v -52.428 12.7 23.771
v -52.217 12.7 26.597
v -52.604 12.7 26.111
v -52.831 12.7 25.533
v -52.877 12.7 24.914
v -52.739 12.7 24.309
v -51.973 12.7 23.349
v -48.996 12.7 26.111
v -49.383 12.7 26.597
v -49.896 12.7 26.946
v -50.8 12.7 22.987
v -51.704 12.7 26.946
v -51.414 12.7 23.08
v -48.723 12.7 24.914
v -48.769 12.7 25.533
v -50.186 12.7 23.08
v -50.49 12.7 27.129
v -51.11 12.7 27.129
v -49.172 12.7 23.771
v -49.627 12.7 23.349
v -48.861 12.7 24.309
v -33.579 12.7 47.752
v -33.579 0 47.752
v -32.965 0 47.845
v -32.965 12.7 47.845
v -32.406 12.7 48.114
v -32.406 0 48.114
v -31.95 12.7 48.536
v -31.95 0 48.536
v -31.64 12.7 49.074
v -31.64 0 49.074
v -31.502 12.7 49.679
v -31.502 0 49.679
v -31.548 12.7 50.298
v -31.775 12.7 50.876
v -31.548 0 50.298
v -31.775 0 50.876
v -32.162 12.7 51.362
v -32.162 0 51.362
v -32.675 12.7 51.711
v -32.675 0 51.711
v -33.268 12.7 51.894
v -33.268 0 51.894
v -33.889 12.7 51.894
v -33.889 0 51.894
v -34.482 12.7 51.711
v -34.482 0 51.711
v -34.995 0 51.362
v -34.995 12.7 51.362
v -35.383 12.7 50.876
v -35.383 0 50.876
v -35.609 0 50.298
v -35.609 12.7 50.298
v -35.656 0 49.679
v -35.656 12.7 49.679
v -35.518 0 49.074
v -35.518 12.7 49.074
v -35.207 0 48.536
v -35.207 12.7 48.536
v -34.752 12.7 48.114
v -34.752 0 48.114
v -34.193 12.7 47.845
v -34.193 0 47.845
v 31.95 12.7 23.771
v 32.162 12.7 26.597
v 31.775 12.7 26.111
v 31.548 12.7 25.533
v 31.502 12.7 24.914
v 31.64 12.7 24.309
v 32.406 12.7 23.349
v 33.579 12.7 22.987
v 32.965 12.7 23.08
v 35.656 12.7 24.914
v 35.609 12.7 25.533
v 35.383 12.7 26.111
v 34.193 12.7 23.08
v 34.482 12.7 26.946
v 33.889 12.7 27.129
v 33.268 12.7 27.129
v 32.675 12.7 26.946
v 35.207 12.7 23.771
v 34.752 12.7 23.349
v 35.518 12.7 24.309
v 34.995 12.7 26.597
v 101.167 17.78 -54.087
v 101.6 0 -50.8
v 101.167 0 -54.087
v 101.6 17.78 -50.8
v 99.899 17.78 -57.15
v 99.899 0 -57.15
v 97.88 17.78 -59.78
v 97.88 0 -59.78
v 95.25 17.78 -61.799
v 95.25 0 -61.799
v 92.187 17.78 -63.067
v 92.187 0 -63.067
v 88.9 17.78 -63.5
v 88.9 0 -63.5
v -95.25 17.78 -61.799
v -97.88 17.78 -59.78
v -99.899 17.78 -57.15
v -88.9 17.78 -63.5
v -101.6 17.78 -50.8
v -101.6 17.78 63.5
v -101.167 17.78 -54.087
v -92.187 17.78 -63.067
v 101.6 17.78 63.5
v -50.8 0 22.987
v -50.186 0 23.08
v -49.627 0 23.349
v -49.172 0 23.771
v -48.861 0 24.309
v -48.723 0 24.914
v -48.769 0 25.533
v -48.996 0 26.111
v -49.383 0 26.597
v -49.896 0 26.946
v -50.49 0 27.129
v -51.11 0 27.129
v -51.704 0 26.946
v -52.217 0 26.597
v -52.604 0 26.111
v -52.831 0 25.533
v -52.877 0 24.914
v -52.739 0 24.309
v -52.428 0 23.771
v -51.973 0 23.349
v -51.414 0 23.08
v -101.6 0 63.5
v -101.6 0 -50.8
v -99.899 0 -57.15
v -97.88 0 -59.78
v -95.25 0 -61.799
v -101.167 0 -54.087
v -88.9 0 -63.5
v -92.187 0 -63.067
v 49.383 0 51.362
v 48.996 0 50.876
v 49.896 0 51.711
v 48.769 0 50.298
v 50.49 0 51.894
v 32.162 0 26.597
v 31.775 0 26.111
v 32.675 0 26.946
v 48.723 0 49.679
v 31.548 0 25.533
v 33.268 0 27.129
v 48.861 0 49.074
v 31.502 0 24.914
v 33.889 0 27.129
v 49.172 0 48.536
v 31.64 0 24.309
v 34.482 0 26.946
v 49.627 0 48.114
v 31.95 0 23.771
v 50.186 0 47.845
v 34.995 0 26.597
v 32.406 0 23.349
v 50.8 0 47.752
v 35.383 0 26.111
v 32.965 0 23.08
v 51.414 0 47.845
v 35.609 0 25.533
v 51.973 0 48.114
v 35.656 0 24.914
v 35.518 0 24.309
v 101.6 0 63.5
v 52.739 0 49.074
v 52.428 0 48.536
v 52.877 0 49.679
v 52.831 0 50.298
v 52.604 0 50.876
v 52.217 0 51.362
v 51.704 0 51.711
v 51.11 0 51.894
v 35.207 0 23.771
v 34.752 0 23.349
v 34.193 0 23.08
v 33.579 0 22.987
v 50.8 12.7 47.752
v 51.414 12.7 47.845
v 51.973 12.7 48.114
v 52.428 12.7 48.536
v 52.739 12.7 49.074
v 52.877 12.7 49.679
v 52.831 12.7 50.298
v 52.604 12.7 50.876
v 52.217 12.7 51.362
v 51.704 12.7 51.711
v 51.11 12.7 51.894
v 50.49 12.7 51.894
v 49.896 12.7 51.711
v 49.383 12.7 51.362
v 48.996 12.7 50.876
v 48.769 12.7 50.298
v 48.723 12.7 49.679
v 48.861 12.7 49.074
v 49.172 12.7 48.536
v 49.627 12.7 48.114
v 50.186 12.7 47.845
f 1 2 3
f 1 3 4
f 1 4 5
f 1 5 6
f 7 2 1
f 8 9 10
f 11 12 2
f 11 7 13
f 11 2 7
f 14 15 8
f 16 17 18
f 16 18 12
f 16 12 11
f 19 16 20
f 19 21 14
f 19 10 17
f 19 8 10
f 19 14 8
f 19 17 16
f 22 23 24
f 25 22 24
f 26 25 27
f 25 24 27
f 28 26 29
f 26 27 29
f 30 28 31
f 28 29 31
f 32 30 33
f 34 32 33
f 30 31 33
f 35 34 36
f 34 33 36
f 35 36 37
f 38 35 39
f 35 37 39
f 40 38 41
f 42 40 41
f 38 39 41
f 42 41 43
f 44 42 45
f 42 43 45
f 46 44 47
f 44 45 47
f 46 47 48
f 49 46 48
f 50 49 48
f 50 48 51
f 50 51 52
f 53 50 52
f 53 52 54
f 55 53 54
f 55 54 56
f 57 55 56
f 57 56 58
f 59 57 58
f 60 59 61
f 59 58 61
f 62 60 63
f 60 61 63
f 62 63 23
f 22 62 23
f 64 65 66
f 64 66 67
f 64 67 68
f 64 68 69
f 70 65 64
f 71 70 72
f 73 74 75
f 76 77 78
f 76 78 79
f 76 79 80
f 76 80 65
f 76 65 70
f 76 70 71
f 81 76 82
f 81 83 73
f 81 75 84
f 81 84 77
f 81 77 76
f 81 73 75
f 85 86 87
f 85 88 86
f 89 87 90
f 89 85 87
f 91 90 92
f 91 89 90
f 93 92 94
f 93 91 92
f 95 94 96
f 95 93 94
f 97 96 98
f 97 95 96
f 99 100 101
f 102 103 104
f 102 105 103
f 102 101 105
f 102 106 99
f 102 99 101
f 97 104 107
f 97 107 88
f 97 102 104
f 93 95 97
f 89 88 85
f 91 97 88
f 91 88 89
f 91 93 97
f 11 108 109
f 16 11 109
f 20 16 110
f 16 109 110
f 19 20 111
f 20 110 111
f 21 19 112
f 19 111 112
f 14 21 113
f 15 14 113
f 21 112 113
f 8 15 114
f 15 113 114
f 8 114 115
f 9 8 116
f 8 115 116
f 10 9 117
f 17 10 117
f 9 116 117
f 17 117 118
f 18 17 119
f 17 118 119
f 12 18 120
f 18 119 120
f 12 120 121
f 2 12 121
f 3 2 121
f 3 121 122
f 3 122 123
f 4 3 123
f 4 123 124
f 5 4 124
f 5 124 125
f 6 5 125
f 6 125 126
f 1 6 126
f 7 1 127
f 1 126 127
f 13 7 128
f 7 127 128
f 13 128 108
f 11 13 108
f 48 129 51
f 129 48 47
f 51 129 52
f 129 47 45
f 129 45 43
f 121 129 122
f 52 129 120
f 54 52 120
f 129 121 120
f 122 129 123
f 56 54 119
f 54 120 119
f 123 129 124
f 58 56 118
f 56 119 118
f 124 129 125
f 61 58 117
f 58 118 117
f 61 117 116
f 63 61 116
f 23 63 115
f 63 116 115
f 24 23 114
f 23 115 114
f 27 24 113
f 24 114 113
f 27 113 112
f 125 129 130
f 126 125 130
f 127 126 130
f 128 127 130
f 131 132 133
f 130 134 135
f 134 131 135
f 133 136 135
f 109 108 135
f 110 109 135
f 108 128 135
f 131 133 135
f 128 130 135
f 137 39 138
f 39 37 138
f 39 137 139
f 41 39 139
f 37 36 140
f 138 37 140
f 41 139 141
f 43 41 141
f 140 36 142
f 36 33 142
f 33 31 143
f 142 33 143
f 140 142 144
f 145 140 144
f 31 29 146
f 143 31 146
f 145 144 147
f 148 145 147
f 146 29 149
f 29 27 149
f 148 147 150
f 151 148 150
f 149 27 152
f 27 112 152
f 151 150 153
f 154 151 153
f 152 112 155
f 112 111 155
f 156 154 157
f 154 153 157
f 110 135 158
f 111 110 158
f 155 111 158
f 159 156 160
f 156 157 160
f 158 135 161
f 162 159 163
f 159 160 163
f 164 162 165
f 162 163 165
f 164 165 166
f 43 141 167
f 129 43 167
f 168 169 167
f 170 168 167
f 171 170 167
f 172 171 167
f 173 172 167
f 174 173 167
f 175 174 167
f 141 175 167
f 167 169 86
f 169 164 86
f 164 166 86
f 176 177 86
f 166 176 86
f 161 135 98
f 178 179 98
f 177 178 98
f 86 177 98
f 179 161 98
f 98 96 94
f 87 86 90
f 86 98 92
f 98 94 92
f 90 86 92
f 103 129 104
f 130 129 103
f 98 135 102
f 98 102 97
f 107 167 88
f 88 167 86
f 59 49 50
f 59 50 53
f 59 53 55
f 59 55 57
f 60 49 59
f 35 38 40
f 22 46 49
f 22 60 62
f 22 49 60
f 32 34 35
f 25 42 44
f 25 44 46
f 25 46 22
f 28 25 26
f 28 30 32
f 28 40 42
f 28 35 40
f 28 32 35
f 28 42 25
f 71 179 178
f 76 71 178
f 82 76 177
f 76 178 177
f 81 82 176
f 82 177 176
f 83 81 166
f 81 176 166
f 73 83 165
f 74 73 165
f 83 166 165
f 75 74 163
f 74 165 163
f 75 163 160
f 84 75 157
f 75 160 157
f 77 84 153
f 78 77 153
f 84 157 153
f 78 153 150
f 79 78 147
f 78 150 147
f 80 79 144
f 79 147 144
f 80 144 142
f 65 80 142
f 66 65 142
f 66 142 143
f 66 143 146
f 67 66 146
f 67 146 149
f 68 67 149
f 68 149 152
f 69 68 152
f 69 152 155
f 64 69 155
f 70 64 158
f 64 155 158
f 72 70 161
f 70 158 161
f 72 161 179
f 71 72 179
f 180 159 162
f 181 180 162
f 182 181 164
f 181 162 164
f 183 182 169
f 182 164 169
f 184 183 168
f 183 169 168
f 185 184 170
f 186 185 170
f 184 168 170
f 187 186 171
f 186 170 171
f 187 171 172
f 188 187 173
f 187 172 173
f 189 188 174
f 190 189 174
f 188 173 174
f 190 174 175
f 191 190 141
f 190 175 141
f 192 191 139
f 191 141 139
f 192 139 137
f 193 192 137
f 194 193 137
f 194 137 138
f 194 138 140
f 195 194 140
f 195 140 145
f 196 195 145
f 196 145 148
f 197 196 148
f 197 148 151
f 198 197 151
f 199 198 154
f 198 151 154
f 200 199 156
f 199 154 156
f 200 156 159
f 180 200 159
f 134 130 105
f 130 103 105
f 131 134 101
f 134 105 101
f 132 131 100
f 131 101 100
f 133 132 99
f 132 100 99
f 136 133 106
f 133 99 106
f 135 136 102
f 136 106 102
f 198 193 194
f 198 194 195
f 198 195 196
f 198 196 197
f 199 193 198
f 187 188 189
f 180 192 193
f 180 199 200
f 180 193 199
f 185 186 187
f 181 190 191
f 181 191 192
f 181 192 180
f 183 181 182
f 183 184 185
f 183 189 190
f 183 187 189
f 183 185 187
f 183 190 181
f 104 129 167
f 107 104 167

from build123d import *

# Parameters (mm, degrees)
SKETCH2_W           = 203.2
SKETCH2_H           = 127
BOSS_EXTRUDE2_DEPTH = 17.78
FILLET1_R           = 12.7
SKETCH5_R           = 2.0828
CUT_EXTRUDE2_DEPTH  = 12.7


with BuildPart() as part:
    # Sketch2 → Boss-Extrude2 (new body)
    with BuildSketch(Plane(origin=(0, 0, 0), x_dir=(1, 0, 0), z_dir=(0, 1, 0))):
        Rectangle(SKETCH2_W, SKETCH2_H)
    extrude(amount=BOSS_EXTRUDE2_DEPTH)

    # Fillet1
    fillet1_edges = [part.edges().sort_by_distance(p)[0] for p in [
        (-101.6, 8.89, -63.5),
        (101.6, 8.89, -63.5),
    ]]
    fillet(fillet1_edges, radius=FILLET1_R)

    # Sketch5 → Cut-Extrude2 (cut)
    with BuildSketch(Plane.XZ):
        with Locations(Location((50.8, 49.8348, 0), (0, 0, 270))):
            Circle(SKETCH5_R)
        with Locations(Location((33.5788, 25.0698, 0), (0, 0, 270))):
            Circle(SKETCH5_R)
        with Locations(Location((-50.8, 25.0698, 0), (0, 0, 270))):
            Circle(SKETCH5_R)
        with Locations(Location((-33.5788, 49.8348, 0), (0, 0, 270))):
            Circle(SKETCH5_R)
    extrude(amount=-CUT_EXTRUDE2_DEPTH, mode=Mode.SUBTRACT)


solid = part.part
